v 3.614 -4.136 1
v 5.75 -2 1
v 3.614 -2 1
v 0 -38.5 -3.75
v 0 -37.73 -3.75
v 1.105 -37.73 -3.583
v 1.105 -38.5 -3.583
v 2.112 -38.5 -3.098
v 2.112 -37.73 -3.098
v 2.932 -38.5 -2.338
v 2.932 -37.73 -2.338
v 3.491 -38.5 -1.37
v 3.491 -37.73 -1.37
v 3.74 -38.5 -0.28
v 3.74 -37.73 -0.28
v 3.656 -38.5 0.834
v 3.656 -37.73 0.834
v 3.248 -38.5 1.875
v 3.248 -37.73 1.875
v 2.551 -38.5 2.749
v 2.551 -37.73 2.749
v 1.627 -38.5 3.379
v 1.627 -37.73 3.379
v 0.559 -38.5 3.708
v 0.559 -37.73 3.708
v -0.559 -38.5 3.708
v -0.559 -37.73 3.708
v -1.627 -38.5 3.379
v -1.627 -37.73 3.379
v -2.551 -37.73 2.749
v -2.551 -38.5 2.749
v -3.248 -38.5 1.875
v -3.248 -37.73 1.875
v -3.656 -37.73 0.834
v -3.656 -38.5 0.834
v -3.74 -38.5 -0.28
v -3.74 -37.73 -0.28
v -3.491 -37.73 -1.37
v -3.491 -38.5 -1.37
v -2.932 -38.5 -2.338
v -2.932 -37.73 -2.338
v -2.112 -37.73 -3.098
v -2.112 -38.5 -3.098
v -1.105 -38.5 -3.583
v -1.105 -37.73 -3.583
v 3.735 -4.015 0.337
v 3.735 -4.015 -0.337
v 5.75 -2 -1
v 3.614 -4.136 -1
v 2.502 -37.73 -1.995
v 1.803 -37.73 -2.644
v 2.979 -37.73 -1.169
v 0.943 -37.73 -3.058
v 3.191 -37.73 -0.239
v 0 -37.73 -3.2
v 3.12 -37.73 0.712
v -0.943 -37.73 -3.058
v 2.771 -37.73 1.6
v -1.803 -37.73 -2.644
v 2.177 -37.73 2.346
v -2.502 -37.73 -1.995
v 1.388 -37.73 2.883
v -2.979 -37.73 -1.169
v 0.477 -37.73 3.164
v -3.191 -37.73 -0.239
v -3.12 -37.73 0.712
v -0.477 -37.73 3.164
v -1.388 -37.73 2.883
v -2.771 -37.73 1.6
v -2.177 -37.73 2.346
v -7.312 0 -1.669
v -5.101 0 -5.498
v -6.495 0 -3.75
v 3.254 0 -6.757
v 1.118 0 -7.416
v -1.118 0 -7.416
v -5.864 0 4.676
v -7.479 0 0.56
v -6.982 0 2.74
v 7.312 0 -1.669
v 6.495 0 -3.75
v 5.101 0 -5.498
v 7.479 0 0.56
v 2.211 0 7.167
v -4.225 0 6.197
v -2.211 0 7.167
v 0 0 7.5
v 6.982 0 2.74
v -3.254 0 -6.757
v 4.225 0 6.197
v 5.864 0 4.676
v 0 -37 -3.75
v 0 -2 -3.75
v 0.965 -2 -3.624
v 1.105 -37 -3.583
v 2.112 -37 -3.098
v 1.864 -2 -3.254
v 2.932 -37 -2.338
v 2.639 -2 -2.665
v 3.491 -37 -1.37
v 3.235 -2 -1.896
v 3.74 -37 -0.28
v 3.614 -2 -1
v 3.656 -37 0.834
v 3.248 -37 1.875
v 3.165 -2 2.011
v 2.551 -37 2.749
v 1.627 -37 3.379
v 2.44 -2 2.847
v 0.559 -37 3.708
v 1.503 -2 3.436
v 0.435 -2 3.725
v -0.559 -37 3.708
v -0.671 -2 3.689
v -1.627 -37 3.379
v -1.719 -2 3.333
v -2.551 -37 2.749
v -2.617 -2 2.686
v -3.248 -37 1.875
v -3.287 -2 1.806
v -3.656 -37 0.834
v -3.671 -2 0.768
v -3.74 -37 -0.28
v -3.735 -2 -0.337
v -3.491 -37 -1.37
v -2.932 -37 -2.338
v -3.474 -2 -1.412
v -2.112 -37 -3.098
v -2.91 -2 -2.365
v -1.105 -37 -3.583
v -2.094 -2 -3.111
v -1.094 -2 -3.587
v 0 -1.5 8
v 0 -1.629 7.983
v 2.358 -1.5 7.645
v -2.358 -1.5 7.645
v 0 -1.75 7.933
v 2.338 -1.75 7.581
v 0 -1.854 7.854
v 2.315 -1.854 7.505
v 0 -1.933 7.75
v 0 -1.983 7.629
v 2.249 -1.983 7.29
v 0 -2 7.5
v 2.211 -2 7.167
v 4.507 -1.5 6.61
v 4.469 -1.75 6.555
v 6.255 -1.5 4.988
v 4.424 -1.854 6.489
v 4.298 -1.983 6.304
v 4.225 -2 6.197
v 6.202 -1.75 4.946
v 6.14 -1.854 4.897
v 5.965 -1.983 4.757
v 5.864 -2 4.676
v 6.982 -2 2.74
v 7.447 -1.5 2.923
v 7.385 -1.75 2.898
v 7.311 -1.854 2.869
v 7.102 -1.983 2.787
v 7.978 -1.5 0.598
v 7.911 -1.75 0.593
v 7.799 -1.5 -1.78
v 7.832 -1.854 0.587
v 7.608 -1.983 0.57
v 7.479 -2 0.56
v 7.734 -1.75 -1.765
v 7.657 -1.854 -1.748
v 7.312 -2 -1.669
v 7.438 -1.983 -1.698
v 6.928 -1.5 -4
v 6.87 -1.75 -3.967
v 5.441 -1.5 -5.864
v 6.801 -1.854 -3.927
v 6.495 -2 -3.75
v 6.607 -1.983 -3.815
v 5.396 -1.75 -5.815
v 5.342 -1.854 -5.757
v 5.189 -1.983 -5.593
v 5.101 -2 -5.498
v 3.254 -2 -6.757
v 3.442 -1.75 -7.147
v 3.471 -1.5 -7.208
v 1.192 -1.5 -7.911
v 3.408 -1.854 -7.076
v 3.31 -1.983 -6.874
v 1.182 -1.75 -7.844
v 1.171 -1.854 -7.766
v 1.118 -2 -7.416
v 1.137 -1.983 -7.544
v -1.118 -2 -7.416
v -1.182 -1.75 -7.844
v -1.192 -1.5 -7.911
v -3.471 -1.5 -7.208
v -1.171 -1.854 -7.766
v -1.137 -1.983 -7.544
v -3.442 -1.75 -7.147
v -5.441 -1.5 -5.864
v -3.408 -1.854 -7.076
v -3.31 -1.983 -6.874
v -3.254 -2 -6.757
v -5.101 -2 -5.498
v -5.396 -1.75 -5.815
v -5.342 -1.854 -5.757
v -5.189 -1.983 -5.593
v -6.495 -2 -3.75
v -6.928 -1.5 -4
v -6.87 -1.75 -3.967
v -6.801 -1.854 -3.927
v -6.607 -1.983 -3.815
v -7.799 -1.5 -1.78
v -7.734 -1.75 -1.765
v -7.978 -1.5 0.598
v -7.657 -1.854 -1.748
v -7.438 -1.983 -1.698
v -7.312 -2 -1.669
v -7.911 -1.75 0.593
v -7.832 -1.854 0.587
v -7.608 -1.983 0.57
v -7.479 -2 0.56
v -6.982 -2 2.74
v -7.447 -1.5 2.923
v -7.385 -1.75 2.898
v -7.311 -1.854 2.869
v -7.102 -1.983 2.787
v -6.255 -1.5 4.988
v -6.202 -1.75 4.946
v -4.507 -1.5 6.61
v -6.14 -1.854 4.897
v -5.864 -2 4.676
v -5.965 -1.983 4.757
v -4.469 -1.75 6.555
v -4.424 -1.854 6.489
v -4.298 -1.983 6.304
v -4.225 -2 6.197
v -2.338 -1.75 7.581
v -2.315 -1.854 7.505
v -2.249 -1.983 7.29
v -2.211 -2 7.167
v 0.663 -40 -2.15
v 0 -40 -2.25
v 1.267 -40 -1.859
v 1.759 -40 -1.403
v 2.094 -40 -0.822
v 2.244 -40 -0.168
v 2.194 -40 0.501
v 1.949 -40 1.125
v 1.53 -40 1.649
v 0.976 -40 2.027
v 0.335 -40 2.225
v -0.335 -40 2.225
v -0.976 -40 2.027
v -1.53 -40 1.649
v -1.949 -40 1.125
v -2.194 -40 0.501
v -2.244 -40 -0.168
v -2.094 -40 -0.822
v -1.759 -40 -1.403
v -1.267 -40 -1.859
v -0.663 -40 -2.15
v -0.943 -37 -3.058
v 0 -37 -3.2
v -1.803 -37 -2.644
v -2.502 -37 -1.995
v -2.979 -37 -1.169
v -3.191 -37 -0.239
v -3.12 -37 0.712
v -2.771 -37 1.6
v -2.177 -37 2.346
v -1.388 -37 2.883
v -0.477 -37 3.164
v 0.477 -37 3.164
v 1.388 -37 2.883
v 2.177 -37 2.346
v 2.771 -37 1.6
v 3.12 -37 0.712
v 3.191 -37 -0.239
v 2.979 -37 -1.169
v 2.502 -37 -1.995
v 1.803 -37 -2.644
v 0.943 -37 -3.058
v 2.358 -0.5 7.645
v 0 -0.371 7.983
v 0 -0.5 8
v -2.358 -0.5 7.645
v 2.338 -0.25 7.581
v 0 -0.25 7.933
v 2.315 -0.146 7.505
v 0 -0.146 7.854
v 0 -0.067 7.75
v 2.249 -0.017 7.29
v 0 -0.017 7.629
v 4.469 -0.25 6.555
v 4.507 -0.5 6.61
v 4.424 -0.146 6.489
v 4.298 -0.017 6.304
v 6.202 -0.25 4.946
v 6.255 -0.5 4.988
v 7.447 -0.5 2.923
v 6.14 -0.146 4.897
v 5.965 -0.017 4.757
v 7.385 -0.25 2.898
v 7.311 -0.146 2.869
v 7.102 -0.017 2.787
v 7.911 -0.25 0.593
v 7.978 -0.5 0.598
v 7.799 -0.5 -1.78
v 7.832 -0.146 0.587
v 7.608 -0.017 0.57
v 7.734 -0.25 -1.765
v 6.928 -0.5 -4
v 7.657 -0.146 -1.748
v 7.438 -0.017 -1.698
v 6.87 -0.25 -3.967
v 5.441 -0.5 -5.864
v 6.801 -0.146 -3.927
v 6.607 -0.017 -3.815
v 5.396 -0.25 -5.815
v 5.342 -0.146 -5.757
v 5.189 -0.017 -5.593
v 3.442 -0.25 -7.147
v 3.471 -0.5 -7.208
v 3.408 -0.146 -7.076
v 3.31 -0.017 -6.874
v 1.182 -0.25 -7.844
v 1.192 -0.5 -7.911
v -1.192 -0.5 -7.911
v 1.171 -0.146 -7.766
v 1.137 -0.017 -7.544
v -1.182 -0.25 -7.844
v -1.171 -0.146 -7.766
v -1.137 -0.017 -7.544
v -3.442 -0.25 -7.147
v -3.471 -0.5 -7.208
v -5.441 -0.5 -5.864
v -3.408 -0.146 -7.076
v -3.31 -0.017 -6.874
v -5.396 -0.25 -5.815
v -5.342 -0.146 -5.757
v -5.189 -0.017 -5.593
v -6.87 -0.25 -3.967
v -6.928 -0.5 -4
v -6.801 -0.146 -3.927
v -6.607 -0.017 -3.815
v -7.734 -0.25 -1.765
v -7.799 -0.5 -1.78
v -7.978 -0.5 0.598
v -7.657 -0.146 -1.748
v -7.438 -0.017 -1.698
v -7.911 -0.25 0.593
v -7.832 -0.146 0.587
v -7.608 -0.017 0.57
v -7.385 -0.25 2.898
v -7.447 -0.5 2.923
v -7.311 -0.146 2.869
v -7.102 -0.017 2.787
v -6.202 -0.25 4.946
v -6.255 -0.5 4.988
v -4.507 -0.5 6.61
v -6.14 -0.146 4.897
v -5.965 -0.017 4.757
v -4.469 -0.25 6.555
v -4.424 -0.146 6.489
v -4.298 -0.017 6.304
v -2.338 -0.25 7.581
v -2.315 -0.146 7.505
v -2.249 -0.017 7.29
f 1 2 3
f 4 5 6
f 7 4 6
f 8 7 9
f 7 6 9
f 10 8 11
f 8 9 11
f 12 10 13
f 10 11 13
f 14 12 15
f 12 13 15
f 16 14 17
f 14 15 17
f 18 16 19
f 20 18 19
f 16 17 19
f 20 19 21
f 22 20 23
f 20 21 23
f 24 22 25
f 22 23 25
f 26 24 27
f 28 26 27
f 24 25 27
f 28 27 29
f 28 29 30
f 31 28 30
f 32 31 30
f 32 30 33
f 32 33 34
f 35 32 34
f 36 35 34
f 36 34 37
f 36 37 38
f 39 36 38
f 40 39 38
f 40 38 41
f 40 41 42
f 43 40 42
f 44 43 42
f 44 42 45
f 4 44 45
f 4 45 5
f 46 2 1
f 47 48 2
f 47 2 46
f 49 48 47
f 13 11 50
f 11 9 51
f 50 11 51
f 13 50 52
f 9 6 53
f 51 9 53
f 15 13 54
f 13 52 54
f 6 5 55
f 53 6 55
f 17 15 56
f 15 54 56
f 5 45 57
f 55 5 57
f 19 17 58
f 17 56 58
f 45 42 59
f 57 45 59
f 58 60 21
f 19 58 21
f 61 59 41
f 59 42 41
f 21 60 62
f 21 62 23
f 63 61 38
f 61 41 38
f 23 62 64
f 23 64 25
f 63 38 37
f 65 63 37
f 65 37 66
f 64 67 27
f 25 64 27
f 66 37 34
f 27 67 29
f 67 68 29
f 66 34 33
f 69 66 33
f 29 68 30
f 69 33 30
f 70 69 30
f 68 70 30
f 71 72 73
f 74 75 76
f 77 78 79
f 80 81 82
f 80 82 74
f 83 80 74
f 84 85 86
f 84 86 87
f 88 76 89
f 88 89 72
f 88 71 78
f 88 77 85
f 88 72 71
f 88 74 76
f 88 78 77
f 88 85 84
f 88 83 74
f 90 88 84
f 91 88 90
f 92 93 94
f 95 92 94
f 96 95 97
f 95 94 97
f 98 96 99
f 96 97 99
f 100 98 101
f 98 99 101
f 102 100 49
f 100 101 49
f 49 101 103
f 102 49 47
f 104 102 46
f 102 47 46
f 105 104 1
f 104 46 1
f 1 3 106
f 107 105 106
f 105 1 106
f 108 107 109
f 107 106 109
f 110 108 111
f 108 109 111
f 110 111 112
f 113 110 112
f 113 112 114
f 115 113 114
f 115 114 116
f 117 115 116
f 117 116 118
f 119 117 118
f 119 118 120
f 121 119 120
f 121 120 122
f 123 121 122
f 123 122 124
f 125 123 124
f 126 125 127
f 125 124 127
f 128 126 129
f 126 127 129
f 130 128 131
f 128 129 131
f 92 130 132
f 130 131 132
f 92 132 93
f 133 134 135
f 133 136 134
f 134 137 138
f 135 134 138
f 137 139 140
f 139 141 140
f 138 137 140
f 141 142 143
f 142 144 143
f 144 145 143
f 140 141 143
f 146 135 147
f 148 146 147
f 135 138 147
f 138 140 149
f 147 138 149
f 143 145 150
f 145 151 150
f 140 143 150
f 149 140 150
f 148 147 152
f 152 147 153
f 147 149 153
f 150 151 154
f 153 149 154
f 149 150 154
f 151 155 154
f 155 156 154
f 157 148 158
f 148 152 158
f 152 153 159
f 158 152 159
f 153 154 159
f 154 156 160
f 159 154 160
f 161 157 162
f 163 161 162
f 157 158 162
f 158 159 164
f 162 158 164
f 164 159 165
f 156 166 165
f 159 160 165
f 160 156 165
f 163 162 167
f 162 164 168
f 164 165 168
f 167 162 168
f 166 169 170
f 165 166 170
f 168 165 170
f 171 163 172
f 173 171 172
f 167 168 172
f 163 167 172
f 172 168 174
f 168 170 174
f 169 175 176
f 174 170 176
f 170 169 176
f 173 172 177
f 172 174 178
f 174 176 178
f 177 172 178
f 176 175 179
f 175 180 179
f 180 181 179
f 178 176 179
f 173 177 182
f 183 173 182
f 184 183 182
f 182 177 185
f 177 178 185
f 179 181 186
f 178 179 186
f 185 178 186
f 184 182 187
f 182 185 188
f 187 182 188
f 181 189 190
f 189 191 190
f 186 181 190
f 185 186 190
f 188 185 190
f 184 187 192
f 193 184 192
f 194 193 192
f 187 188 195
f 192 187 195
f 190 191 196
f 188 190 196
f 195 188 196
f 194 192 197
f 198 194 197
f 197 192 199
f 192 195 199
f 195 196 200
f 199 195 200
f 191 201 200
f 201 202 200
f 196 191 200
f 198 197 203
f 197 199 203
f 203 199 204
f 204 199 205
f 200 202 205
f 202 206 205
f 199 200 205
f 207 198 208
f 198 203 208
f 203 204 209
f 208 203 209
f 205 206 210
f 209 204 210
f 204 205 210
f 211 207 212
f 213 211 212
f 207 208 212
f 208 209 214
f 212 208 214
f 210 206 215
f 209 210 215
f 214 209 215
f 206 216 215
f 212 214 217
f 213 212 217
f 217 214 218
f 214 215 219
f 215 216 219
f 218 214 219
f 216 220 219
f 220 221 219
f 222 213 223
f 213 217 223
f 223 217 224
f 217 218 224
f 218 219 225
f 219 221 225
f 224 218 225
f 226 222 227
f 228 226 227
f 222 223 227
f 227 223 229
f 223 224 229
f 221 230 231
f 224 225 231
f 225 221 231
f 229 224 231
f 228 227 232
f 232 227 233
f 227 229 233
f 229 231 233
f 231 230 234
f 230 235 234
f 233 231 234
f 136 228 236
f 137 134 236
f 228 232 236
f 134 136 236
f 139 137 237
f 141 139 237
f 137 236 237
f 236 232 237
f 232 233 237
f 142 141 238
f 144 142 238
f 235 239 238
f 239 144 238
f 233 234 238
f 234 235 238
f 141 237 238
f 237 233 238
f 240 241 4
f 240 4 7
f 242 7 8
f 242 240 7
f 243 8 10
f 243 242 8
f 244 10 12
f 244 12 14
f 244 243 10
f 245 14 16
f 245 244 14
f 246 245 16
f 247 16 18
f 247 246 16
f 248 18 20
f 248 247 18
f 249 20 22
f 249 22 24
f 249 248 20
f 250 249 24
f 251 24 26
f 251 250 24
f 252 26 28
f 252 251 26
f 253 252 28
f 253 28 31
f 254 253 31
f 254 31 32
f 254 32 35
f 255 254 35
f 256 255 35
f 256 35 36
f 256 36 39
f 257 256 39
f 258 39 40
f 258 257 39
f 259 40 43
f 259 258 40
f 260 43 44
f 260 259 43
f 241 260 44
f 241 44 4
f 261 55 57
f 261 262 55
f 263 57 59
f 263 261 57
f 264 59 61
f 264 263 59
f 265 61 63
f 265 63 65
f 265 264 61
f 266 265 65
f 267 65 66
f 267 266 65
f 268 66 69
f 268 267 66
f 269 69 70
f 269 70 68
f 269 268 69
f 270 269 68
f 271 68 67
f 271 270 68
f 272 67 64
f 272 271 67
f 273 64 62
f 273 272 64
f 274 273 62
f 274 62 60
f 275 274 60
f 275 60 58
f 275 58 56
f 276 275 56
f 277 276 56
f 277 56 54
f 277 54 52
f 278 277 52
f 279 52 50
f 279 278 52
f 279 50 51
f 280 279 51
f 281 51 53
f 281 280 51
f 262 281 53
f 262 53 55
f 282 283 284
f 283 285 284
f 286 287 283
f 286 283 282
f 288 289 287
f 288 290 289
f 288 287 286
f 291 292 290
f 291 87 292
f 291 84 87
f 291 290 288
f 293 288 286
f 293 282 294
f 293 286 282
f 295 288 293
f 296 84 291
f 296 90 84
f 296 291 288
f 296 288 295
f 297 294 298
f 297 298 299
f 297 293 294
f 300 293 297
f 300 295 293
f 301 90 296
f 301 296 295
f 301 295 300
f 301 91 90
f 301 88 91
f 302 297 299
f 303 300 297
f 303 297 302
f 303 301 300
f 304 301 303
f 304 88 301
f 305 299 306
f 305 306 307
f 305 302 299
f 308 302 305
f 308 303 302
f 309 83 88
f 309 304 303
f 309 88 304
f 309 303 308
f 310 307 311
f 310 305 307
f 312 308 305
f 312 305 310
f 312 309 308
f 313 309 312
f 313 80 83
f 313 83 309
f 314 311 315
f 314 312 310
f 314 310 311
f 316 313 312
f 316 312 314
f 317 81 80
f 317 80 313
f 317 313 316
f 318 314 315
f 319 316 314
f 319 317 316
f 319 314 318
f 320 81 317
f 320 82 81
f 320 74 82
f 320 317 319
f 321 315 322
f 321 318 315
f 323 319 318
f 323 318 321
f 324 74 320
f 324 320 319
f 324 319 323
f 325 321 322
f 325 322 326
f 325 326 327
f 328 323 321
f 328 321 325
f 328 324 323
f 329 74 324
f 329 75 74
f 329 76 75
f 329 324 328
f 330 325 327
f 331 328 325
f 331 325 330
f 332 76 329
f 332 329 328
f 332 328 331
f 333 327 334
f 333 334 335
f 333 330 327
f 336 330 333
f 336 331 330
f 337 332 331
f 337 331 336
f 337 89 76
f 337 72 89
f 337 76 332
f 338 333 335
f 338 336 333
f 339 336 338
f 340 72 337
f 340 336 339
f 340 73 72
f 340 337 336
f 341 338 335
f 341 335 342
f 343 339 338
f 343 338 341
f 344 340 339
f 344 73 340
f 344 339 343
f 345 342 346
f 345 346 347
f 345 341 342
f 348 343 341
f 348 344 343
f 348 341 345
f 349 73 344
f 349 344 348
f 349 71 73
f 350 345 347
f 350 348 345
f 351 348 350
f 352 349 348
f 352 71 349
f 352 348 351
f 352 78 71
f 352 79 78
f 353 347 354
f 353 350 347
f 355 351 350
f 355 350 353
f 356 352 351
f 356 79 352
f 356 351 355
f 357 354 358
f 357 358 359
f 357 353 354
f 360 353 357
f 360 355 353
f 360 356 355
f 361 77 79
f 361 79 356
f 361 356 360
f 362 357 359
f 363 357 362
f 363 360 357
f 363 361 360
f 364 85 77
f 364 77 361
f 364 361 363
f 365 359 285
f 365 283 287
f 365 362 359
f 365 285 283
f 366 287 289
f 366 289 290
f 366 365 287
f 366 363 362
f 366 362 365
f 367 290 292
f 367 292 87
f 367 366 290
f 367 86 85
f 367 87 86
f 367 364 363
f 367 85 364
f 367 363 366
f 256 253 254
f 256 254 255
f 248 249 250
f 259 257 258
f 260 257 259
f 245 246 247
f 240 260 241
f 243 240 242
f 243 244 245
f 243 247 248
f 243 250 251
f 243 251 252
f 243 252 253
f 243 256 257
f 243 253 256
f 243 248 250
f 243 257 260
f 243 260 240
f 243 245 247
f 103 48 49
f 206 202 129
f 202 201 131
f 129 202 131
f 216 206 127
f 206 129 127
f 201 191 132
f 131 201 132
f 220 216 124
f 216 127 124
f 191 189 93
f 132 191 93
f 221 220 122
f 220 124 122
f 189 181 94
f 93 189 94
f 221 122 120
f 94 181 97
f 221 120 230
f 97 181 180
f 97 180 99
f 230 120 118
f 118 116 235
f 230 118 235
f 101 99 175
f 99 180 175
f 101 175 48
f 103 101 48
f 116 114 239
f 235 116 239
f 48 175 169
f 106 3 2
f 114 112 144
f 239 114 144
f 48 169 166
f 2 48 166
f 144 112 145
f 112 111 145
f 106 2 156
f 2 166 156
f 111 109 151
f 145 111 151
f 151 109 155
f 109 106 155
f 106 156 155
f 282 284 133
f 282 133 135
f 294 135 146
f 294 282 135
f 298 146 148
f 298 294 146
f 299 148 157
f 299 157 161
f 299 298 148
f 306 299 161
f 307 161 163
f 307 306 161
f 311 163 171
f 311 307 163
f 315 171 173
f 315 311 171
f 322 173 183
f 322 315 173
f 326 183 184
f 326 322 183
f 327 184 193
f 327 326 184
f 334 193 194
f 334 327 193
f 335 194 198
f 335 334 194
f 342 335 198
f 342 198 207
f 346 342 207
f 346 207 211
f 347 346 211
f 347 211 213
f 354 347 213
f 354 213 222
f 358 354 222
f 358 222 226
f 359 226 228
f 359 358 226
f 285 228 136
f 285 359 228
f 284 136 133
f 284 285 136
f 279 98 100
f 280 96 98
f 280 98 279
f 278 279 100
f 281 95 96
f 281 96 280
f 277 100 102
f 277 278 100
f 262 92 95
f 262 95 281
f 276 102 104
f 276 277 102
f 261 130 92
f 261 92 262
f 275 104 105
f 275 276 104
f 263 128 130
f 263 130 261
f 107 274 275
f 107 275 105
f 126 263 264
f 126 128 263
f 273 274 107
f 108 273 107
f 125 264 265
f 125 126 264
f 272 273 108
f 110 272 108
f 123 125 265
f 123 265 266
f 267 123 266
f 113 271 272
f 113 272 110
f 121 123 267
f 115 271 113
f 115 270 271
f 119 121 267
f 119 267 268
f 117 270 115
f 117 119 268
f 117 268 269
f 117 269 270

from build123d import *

# Parameters (mm, degrees)
SKETCH1_R           = 8
BOSS_EXTRUDE1_DEPTH = 2
SKETCH2_R           = 3.75
BOSS_EXTRUDE2_DEPTH = 38
RIB2_REACH          = 43.569
SKETCH3_WALL_W      = 87.966865888
SKETCH3_WALL_H      = 2
SKETCH5_W           = 2
SKETCH5_H           = 0.73
FILLET1_R           = 0.5
CHAMFER1_SIZE       = 1.5


with BuildPart() as part:
    # Sketch1 → Boss-Extrude1 (new body)
    with BuildSketch(Plane(origin=(0, 0, 0), x_dir=(1, 0, 0), z_dir=(0, 1, 0))):
        with Locations(Location((0, 0, 0), (0, 0, 270))):
            Circle(SKETCH1_R)
    extrude(amount=-BOSS_EXTRUDE1_DEPTH)

    # Sketch2 → Boss-Extrude2 (add)
    with BuildSketch(Plane.XZ.offset(2)):
        with Locations(Location((0, 0, 0), (0, 0, 270))):
            Circle(SKETCH2_R)
    extrude(amount=BOSS_EXTRUDE2_DEPTH)

    # Sketch3 wall → Rib2 (add, up to next)
    with BuildSketch(Plane(origin=(4.75, -3, 0), x_dir=(-0.707106781187, -0.707106781187, 0), z_dir=(0.707106781187, -0.707106781187, 0)), mode=Mode.PRIVATE) as rib2_sk1:
        Rectangle(SKETCH3_WALL_W, SKETCH3_WALL_H)
    rib2_tool1 = extrude(rib2_sk1.sketch, amount=-RIB2_REACH, mode=Mode.PRIVATE) - part.part
    add(rib2_tool1.solids().sort_by_distance((4.75, -3, 0))[0])

    # Sketch5 → Cut-Revolve1 (revolve, cut)
    with BuildSketch(Plane(origin=(0, 0, 0), x_dir=(0, 0, -1), z_dir=(1, 0, 0))):
        with Locations((4.2, -37.365)):
            Rectangle(SKETCH5_W, SKETCH5_H)
    revolve(axis=Axis((0, -40, 0), (0, 1, 0)), mode=Mode.SUBTRACT)

    # Fillet1
    fillet1_edges = [part.edges().sort_by_distance(p)[0] for p in [
        (0, 0, -8),
        (0, -2, -8),
    ]]
    fillet(fillet1_edges, radius=FILLET1_R)

    # Chamfer1
    chamfer1_edges = [part.edges().sort_by_distance(p)[0] for p in [
        (0, -40, 3.75),
    ]]
    chamfer(chamfer1_edges, length=CHAMFER1_SIZE)


solid = part.part
